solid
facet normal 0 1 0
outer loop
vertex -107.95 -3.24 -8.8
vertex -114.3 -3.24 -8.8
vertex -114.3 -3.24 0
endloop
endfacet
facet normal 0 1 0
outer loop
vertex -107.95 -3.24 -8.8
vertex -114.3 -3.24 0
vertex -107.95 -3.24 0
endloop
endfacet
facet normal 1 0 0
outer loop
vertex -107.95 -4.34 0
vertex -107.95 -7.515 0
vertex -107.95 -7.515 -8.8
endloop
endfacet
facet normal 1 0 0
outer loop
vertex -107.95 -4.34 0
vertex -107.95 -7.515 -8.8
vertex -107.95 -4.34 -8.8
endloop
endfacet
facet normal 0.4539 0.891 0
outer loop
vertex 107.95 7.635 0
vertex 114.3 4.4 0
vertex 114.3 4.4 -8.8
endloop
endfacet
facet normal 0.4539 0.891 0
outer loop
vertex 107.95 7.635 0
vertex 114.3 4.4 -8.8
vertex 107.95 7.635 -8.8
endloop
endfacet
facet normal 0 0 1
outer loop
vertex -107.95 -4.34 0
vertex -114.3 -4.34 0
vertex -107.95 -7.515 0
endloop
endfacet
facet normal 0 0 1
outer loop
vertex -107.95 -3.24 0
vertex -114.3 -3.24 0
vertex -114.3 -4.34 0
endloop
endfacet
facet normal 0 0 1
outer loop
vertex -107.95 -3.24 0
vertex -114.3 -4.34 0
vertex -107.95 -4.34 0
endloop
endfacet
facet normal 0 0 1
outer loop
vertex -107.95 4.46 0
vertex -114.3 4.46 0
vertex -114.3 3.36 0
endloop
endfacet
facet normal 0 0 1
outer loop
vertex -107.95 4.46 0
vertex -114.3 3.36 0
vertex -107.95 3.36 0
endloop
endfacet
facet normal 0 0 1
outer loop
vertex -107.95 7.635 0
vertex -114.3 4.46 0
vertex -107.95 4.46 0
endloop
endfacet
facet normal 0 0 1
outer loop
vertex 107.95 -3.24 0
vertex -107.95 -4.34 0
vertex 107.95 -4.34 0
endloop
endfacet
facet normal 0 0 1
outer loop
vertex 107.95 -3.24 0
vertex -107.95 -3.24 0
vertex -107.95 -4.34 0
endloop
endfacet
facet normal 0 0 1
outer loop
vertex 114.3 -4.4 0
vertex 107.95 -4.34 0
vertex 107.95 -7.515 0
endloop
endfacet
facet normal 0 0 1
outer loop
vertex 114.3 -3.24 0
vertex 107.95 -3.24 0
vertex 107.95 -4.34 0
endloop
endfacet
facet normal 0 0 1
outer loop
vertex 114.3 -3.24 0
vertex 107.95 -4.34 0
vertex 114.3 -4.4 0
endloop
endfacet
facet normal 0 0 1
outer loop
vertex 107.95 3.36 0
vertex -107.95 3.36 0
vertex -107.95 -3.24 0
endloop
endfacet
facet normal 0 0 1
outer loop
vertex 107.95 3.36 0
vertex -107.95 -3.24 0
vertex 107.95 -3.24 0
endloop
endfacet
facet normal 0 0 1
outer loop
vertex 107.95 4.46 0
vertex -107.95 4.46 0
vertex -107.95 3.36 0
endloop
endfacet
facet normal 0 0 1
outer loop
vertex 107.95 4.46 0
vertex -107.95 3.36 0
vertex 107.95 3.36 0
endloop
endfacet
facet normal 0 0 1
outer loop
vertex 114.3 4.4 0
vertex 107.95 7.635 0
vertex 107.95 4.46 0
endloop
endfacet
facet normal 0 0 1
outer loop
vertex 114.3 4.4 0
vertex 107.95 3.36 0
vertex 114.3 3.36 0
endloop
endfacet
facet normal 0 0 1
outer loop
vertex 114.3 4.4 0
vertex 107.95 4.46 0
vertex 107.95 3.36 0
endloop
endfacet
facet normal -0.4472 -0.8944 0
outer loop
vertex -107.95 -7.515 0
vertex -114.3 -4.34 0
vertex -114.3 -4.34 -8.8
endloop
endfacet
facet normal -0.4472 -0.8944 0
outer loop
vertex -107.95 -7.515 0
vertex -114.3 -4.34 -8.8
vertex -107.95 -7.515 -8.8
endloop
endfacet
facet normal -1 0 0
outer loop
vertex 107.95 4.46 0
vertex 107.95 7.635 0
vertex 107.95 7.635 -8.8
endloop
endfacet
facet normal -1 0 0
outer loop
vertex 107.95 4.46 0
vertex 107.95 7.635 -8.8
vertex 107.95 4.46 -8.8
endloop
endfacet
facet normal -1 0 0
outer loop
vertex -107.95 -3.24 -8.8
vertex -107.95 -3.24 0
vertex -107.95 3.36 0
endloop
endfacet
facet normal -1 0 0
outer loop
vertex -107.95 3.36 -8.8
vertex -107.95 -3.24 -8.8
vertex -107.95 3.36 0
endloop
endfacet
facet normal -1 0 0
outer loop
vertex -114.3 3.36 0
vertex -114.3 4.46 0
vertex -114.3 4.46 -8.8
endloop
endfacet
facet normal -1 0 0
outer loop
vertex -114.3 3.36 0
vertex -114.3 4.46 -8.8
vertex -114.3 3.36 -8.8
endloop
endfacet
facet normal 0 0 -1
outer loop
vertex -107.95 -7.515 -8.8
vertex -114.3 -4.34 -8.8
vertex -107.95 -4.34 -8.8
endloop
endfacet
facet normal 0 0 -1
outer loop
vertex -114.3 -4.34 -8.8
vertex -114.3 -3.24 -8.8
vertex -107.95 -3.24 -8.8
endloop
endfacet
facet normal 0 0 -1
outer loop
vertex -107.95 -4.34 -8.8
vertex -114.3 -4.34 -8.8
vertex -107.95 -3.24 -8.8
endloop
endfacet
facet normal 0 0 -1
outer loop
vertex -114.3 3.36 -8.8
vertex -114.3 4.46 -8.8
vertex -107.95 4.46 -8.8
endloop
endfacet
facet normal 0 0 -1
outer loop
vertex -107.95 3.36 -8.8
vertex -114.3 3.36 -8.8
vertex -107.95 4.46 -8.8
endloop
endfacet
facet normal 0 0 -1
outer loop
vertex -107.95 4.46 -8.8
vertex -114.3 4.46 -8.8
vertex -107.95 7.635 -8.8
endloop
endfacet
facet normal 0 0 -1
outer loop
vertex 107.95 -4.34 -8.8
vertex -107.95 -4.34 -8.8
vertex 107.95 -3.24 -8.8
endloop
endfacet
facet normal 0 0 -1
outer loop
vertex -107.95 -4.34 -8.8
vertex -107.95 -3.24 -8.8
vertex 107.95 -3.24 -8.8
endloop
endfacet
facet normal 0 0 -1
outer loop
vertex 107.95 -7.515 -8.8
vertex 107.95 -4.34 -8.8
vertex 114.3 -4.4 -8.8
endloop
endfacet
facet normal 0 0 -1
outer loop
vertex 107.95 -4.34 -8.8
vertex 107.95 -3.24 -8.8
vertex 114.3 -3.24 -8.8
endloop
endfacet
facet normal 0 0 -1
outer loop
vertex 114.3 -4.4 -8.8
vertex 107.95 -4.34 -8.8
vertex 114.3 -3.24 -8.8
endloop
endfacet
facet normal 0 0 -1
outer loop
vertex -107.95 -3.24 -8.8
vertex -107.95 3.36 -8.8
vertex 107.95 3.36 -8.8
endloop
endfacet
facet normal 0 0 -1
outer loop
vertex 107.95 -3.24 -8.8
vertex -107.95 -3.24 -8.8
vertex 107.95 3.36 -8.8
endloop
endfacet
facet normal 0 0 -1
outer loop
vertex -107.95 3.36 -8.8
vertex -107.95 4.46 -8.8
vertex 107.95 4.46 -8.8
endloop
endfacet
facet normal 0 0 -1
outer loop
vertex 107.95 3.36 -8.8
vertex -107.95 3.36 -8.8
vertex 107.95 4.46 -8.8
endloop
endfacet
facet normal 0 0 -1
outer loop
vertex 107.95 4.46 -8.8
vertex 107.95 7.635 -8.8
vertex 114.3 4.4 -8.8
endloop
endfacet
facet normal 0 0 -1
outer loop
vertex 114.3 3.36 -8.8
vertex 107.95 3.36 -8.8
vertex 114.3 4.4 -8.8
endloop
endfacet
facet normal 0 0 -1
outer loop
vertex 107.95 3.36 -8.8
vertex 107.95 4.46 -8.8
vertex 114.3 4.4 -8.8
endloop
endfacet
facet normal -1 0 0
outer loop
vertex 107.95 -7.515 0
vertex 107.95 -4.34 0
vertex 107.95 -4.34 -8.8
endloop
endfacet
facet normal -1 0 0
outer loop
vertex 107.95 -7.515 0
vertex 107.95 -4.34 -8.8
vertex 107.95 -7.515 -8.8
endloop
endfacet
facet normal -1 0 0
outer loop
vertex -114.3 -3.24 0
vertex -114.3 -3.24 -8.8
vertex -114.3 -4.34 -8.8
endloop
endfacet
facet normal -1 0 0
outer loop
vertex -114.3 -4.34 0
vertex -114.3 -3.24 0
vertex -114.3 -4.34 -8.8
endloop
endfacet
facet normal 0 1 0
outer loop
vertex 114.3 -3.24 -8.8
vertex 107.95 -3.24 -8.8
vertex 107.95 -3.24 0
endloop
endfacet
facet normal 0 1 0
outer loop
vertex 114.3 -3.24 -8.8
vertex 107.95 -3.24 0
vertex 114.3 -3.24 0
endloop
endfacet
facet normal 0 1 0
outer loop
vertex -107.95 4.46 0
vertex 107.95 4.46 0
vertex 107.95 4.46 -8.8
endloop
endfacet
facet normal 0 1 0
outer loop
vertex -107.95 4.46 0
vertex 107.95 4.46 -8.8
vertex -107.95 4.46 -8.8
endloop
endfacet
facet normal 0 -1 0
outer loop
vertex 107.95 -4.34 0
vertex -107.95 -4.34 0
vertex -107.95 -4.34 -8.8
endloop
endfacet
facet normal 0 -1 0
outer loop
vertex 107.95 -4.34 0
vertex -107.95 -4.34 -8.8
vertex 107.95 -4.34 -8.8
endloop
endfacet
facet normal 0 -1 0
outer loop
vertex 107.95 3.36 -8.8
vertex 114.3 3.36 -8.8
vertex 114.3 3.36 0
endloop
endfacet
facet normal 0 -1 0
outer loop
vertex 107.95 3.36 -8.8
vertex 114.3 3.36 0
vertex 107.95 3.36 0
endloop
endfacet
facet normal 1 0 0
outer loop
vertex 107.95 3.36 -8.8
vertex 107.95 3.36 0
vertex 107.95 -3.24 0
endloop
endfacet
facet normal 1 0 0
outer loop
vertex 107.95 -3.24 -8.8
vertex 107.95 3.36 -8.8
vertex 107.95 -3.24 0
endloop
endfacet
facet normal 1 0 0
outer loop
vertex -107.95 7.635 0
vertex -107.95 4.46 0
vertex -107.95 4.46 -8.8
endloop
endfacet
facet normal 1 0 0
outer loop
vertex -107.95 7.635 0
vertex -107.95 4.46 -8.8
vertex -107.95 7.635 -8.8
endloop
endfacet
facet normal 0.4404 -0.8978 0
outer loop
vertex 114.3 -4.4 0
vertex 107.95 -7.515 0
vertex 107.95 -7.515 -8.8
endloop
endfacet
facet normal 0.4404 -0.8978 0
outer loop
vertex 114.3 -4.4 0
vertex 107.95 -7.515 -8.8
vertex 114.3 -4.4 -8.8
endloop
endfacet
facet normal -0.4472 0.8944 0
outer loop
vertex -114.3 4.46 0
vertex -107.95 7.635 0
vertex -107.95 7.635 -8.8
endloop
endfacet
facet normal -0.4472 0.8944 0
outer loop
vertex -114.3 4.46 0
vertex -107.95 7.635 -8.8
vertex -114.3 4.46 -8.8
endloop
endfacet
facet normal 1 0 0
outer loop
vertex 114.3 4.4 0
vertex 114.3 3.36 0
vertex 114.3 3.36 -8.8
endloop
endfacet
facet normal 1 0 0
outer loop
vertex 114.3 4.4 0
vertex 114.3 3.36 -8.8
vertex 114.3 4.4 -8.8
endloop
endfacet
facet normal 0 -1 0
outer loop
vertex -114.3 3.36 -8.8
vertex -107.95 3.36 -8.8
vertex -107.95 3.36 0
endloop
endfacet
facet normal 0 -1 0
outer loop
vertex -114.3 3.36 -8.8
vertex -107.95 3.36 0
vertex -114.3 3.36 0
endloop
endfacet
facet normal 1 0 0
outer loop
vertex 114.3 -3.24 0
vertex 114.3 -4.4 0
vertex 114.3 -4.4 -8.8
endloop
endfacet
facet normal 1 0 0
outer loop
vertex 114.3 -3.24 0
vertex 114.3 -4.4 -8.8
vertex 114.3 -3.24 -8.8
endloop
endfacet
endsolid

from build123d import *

# Parameters (mm, degrees)
F1_DEPTH = 8.8
F2_DEPTH = 25
F3_DEPTH = 25


with BuildPart() as f1:
    # F0 (on Top) → F1 (new body)
    with BuildSketch(Plane.XY):
        Polygon((107.95, 4.459752), (0, 4.459752), (-107.95, 4.459752), (-107.95, 3.359752), (-107.95, -3.240248), (-107.95, -4.340248), (107.95, -4.340248), (107.95, -3.240248), (107.95, 0), (107.95, 0.059752), (107.95, 3.359752), align=None)
        Polygon((-107.95, 3.359752), (-107.95, 4.459752), (-107.95, 7.634752), (-114.3, 4.459752), (-114.3, 3.359752), align=None)
        Polygon((107.95, 7.634752), (107.95, 4.459752), (107.95, 3.359752), (114.3, 3.359752), (114.3, 4.4), align=None)
        Polygon((-107.95, -3.240248), (-107.95, 3.359752), (-114.3, 3.359752), (-114.3, 0.059752), (-114.3, -3.240248), align=None)
        Polygon((114.3, 3.359752), (107.95, 3.359752), (107.95, 0.059752), (107.95, 0), (107.95, -3.240248), (114.3, -3.240248), (114.3, 0), align=None)
        Polygon((-107.95, -4.340248), (-107.95, -3.240248), (-114.3, -3.240248), (-114.3, -4.340248), (-107.95, -7.515248), align=None)
        Polygon((107.95, -3.240248), (107.95, -4.340248), (107.95, -7.515248), (114.3, -4.4), (114.3, -3.240248), align=None)
    extrude(amount=-F1_DEPTH)

    # F0 (on Top) → F2 (cut)
    with BuildSketch(Plane.XY):
        Polygon((-107.95, -3.240248), (-107.95, 3.359752), (-114.3, 3.359752), (-114.3, 0.059752), (-114.3, -3.240248), align=None)
    extrude(amount=-F2_DEPTH, mode=Mode.SUBTRACT)

    # F0 (on Top) → F3 (cut)
    with BuildSketch(Plane.XY):
        Polygon((114.3, 3.359752), (107.95, 3.359752), (107.95, 0.059752), (107.95, 0), (107.95, -3.240248), (114.3, -3.240248), (114.3, 0), align=None)
    extrude(amount=-F3_DEPTH, mode=Mode.SUBTRACT)


solid = f1.part
